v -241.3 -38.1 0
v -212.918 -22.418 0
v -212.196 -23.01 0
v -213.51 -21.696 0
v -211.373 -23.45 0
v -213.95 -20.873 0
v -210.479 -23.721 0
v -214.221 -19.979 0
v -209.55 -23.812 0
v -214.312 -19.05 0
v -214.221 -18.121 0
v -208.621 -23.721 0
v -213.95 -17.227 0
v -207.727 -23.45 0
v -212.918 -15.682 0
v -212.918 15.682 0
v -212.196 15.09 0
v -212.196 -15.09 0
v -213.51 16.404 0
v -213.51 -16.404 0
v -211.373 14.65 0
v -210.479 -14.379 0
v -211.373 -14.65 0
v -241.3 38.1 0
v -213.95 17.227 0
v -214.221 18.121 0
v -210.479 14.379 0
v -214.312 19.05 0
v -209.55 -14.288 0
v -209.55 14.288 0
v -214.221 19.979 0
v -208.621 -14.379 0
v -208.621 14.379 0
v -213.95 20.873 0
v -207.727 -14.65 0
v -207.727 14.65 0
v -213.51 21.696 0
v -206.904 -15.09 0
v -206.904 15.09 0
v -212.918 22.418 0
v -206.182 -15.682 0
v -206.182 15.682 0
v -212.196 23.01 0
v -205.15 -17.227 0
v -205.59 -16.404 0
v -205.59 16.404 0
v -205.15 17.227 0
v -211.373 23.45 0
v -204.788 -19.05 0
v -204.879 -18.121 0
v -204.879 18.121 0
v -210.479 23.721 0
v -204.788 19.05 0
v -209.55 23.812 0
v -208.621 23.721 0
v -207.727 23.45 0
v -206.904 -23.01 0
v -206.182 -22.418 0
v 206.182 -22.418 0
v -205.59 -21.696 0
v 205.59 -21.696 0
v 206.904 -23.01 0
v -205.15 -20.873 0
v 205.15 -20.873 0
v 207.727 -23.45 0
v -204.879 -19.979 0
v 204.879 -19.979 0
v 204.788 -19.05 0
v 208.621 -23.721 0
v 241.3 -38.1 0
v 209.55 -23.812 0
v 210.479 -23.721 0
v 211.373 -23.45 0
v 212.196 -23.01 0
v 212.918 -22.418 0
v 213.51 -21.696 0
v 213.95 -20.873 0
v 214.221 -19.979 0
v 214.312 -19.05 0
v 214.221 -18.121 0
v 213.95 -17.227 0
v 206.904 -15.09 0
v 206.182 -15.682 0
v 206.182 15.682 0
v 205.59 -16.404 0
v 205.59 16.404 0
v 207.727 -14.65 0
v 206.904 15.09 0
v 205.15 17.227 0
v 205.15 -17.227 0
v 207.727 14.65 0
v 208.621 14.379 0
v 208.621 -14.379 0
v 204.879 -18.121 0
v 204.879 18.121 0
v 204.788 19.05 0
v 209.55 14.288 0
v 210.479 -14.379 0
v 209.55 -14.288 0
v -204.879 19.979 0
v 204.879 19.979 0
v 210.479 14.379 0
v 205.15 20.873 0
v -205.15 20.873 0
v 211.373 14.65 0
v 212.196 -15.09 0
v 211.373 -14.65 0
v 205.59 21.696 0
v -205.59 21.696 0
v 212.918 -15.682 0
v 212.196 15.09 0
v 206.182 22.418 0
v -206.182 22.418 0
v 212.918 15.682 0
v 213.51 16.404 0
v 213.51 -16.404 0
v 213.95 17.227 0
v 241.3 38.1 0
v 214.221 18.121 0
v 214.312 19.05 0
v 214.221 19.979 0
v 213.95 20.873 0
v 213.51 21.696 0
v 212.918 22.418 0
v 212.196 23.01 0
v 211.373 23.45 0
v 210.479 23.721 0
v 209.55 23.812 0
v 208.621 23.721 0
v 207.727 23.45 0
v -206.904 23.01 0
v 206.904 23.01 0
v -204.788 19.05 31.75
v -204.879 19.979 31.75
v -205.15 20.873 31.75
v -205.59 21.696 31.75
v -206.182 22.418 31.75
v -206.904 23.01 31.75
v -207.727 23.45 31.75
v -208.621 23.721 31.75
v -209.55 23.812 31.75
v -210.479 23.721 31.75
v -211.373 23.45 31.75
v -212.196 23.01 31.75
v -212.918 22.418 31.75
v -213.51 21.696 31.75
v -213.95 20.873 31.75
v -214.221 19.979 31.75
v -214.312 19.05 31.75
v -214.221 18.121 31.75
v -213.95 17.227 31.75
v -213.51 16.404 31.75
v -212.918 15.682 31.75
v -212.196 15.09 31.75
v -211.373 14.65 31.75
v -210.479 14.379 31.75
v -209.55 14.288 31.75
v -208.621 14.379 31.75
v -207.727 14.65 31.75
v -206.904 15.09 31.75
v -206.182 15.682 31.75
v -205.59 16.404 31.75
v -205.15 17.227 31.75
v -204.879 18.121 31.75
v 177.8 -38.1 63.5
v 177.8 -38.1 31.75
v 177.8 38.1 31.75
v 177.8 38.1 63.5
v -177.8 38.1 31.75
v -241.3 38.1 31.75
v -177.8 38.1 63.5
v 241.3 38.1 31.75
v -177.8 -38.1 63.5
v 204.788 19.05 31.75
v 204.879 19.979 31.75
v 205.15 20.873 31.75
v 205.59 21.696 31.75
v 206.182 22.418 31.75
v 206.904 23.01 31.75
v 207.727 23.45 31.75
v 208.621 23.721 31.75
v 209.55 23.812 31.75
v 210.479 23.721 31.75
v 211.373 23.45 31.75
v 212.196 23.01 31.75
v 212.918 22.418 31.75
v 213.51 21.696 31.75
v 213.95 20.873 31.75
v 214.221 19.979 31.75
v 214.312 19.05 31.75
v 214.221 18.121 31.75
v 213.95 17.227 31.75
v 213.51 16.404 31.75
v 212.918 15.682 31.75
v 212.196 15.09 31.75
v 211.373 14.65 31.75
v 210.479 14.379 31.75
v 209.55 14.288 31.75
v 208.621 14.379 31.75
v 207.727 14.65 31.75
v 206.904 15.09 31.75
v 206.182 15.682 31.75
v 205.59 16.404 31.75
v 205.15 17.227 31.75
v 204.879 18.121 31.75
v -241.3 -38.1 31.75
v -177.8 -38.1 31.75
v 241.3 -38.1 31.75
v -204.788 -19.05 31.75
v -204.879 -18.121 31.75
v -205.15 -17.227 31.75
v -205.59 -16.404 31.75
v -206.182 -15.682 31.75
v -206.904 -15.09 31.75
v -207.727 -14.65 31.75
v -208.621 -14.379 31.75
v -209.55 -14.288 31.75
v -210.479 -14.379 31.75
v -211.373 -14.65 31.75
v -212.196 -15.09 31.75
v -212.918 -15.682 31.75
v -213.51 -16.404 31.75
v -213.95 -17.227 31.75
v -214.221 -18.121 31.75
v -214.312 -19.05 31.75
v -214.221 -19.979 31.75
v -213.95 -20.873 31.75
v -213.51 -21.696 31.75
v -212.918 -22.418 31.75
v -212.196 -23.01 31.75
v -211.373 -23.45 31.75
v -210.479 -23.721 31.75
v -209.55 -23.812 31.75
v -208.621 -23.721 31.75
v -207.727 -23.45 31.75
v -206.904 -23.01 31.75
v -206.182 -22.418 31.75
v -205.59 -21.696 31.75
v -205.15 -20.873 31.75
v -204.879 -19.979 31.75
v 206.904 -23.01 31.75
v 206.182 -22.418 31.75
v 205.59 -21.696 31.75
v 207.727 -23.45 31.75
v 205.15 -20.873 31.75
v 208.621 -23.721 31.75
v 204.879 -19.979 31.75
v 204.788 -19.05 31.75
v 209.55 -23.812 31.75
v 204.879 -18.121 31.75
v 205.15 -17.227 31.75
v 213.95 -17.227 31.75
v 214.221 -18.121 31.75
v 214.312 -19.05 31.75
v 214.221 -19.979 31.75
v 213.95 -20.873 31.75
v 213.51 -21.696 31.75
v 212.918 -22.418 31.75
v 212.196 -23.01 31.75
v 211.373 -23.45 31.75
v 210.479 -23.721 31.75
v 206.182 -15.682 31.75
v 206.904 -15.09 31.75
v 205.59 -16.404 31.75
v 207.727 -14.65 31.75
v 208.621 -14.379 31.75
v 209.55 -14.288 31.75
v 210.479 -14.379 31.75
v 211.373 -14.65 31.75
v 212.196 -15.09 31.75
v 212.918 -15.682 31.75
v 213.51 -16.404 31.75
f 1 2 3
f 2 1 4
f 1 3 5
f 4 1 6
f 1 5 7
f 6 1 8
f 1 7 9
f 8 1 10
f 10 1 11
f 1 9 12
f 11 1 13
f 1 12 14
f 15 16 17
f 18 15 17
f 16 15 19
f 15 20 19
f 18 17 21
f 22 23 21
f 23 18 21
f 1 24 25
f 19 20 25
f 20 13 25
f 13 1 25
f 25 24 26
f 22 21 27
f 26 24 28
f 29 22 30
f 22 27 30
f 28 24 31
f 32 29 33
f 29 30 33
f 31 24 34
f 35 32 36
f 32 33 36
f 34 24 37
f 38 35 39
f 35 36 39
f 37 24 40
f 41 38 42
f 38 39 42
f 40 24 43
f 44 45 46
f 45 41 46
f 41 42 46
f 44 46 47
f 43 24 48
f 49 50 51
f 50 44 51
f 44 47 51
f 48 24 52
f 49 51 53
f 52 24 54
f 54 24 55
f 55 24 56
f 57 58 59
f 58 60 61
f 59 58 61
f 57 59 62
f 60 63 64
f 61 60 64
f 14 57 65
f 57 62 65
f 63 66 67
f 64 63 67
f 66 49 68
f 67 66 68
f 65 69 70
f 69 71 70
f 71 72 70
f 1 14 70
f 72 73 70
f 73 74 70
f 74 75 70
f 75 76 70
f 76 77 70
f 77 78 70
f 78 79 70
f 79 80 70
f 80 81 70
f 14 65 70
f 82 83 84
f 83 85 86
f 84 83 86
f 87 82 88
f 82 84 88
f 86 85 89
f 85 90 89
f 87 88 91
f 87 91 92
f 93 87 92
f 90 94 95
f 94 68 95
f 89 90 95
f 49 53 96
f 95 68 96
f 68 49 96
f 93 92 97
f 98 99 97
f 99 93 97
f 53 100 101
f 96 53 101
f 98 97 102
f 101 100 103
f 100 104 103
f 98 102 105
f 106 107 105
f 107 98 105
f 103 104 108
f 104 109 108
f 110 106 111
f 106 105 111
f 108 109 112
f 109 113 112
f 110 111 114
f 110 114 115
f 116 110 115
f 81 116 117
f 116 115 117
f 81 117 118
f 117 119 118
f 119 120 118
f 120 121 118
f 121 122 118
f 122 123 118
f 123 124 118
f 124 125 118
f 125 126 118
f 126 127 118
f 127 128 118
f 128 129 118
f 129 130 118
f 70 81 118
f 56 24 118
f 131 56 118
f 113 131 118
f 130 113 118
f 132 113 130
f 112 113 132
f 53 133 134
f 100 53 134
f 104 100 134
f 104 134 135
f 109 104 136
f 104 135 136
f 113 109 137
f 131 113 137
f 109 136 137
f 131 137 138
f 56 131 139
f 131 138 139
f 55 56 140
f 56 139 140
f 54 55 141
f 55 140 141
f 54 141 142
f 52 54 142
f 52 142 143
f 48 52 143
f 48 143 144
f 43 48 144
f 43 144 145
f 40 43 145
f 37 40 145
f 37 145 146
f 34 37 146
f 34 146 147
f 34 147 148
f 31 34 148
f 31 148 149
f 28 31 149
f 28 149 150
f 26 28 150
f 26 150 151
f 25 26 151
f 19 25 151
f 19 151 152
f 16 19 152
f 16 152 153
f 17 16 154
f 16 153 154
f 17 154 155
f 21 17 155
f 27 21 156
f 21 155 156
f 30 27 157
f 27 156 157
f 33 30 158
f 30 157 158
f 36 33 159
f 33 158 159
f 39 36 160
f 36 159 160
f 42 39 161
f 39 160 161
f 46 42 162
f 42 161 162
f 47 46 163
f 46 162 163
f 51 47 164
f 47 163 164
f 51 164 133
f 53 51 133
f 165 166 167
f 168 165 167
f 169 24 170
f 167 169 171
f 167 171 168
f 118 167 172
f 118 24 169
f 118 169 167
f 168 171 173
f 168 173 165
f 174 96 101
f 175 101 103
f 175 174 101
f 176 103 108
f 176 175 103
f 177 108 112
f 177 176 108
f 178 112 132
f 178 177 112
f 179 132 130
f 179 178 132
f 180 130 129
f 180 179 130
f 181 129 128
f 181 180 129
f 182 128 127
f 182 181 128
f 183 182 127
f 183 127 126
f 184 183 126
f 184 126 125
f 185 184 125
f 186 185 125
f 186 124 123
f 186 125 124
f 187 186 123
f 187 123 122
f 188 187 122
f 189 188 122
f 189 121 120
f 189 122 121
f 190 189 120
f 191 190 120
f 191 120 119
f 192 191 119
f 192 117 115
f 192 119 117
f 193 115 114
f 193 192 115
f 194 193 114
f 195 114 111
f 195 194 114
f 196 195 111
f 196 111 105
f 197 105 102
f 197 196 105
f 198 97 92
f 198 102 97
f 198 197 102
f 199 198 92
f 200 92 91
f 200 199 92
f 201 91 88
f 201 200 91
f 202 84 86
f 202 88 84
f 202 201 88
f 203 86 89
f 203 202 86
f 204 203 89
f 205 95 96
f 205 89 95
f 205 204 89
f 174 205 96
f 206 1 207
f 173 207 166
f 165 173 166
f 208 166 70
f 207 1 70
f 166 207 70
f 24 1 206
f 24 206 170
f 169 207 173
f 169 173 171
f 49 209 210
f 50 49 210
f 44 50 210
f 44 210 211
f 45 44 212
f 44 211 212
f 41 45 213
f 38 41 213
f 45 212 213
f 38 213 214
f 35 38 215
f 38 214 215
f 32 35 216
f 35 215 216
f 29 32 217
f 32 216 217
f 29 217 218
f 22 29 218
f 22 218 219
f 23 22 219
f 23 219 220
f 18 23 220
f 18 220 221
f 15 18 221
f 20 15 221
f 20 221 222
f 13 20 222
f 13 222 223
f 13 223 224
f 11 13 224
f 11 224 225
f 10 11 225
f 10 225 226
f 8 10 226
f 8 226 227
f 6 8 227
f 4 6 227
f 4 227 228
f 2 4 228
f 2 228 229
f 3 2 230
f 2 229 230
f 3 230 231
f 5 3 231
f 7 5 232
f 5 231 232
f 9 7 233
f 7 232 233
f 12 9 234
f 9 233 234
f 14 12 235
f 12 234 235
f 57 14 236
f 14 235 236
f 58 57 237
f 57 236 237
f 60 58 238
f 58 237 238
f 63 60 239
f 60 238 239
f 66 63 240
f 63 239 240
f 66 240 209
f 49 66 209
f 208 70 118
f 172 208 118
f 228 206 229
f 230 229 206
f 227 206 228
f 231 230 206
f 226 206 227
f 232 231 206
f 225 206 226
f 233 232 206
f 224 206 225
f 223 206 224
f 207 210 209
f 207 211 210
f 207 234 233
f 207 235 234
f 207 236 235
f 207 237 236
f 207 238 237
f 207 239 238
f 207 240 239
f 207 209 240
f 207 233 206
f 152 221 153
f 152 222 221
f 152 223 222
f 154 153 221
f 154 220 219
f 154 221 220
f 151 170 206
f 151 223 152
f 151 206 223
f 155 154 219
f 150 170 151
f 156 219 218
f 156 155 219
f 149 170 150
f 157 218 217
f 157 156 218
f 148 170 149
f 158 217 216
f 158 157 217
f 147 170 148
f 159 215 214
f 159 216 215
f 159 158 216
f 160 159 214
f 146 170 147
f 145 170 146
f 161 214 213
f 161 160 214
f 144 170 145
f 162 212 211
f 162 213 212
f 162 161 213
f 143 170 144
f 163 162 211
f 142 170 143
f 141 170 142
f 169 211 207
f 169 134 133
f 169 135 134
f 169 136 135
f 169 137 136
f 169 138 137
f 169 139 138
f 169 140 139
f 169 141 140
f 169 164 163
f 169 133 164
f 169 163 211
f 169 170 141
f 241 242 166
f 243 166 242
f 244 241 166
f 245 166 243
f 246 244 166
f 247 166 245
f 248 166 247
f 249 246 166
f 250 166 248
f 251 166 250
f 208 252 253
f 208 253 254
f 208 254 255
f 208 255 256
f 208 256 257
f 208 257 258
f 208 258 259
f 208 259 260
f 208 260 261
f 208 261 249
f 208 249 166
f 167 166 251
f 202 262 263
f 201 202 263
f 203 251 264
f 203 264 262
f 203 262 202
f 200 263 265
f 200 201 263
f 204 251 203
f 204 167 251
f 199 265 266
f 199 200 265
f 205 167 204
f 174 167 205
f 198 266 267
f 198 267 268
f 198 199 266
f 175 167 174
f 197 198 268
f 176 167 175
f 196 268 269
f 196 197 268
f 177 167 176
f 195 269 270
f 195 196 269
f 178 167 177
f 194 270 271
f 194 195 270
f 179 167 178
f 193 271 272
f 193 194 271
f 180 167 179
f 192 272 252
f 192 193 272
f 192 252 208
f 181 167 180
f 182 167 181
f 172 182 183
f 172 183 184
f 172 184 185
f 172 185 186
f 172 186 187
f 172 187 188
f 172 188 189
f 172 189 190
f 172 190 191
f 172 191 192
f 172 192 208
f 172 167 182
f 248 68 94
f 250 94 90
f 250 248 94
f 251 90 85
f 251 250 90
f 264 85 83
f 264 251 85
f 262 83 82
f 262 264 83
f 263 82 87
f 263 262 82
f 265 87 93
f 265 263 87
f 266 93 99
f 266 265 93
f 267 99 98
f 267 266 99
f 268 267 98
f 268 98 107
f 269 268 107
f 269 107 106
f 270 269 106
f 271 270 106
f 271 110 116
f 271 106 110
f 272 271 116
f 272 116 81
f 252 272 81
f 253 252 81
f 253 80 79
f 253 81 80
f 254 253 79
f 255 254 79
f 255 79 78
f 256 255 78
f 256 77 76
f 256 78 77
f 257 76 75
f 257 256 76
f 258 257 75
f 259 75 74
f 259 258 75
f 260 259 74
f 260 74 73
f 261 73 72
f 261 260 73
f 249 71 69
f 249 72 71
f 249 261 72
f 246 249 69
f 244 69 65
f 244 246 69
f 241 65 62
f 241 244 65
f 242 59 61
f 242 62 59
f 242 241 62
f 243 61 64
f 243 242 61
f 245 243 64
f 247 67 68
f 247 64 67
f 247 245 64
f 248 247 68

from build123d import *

# Parameters (mm, degrees)
SKETCH1_W           = 482.6
SKETCH1_H           = 76.2
BOSS_EXTRUDE1_DEPTH = 31.75
SKETCH2_W           = 355.6
SKETCH2_H           = 76.2
BOSS_EXTRUDE2_DEPTH = 31.75
SKETCH3_R           = 4.7625
CUT_EXTRUDE1_DEPTH  = 247.343992214


with BuildPart() as part:
    # Sketch1 → Boss-Extrude1 (new body)
    with BuildSketch(Plane.XY):
        Rectangle(SKETCH1_W, SKETCH1_H)
    extrude(amount=BOSS_EXTRUDE1_DEPTH)

    # Sketch2 → Boss-Extrude2 (add)
    with BuildSketch(Plane.XY.offset(31.75)):
        Rectangle(SKETCH2_W, SKETCH2_H)
    extrude(amount=BOSS_EXTRUDE2_DEPTH)

    # Sketch3 → Cut-Extrude1 (cut, through all)
    with BuildSketch(Plane.XY.offset(31.75)):
        with Locations((-209.55, 19.05)):
            Circle(SKETCH3_R)
        with Locations((-209.55, -19.05)):
            Circle(SKETCH3_R)
    cut_extrude1 = extrude(amount=-CUT_EXTRUDE1_DEPTH, mode=Mode.SUBTRACT)

    # Mirror1: Cut-Extrude1 across plane
    add(cut_extrude1.mirror(Plane(origin=(0, 0, 0), x_dir=(0, 0, 1), z_dir=(1, 0, 0))), mode=Mode.SUBTRACT)


solid = part.part
